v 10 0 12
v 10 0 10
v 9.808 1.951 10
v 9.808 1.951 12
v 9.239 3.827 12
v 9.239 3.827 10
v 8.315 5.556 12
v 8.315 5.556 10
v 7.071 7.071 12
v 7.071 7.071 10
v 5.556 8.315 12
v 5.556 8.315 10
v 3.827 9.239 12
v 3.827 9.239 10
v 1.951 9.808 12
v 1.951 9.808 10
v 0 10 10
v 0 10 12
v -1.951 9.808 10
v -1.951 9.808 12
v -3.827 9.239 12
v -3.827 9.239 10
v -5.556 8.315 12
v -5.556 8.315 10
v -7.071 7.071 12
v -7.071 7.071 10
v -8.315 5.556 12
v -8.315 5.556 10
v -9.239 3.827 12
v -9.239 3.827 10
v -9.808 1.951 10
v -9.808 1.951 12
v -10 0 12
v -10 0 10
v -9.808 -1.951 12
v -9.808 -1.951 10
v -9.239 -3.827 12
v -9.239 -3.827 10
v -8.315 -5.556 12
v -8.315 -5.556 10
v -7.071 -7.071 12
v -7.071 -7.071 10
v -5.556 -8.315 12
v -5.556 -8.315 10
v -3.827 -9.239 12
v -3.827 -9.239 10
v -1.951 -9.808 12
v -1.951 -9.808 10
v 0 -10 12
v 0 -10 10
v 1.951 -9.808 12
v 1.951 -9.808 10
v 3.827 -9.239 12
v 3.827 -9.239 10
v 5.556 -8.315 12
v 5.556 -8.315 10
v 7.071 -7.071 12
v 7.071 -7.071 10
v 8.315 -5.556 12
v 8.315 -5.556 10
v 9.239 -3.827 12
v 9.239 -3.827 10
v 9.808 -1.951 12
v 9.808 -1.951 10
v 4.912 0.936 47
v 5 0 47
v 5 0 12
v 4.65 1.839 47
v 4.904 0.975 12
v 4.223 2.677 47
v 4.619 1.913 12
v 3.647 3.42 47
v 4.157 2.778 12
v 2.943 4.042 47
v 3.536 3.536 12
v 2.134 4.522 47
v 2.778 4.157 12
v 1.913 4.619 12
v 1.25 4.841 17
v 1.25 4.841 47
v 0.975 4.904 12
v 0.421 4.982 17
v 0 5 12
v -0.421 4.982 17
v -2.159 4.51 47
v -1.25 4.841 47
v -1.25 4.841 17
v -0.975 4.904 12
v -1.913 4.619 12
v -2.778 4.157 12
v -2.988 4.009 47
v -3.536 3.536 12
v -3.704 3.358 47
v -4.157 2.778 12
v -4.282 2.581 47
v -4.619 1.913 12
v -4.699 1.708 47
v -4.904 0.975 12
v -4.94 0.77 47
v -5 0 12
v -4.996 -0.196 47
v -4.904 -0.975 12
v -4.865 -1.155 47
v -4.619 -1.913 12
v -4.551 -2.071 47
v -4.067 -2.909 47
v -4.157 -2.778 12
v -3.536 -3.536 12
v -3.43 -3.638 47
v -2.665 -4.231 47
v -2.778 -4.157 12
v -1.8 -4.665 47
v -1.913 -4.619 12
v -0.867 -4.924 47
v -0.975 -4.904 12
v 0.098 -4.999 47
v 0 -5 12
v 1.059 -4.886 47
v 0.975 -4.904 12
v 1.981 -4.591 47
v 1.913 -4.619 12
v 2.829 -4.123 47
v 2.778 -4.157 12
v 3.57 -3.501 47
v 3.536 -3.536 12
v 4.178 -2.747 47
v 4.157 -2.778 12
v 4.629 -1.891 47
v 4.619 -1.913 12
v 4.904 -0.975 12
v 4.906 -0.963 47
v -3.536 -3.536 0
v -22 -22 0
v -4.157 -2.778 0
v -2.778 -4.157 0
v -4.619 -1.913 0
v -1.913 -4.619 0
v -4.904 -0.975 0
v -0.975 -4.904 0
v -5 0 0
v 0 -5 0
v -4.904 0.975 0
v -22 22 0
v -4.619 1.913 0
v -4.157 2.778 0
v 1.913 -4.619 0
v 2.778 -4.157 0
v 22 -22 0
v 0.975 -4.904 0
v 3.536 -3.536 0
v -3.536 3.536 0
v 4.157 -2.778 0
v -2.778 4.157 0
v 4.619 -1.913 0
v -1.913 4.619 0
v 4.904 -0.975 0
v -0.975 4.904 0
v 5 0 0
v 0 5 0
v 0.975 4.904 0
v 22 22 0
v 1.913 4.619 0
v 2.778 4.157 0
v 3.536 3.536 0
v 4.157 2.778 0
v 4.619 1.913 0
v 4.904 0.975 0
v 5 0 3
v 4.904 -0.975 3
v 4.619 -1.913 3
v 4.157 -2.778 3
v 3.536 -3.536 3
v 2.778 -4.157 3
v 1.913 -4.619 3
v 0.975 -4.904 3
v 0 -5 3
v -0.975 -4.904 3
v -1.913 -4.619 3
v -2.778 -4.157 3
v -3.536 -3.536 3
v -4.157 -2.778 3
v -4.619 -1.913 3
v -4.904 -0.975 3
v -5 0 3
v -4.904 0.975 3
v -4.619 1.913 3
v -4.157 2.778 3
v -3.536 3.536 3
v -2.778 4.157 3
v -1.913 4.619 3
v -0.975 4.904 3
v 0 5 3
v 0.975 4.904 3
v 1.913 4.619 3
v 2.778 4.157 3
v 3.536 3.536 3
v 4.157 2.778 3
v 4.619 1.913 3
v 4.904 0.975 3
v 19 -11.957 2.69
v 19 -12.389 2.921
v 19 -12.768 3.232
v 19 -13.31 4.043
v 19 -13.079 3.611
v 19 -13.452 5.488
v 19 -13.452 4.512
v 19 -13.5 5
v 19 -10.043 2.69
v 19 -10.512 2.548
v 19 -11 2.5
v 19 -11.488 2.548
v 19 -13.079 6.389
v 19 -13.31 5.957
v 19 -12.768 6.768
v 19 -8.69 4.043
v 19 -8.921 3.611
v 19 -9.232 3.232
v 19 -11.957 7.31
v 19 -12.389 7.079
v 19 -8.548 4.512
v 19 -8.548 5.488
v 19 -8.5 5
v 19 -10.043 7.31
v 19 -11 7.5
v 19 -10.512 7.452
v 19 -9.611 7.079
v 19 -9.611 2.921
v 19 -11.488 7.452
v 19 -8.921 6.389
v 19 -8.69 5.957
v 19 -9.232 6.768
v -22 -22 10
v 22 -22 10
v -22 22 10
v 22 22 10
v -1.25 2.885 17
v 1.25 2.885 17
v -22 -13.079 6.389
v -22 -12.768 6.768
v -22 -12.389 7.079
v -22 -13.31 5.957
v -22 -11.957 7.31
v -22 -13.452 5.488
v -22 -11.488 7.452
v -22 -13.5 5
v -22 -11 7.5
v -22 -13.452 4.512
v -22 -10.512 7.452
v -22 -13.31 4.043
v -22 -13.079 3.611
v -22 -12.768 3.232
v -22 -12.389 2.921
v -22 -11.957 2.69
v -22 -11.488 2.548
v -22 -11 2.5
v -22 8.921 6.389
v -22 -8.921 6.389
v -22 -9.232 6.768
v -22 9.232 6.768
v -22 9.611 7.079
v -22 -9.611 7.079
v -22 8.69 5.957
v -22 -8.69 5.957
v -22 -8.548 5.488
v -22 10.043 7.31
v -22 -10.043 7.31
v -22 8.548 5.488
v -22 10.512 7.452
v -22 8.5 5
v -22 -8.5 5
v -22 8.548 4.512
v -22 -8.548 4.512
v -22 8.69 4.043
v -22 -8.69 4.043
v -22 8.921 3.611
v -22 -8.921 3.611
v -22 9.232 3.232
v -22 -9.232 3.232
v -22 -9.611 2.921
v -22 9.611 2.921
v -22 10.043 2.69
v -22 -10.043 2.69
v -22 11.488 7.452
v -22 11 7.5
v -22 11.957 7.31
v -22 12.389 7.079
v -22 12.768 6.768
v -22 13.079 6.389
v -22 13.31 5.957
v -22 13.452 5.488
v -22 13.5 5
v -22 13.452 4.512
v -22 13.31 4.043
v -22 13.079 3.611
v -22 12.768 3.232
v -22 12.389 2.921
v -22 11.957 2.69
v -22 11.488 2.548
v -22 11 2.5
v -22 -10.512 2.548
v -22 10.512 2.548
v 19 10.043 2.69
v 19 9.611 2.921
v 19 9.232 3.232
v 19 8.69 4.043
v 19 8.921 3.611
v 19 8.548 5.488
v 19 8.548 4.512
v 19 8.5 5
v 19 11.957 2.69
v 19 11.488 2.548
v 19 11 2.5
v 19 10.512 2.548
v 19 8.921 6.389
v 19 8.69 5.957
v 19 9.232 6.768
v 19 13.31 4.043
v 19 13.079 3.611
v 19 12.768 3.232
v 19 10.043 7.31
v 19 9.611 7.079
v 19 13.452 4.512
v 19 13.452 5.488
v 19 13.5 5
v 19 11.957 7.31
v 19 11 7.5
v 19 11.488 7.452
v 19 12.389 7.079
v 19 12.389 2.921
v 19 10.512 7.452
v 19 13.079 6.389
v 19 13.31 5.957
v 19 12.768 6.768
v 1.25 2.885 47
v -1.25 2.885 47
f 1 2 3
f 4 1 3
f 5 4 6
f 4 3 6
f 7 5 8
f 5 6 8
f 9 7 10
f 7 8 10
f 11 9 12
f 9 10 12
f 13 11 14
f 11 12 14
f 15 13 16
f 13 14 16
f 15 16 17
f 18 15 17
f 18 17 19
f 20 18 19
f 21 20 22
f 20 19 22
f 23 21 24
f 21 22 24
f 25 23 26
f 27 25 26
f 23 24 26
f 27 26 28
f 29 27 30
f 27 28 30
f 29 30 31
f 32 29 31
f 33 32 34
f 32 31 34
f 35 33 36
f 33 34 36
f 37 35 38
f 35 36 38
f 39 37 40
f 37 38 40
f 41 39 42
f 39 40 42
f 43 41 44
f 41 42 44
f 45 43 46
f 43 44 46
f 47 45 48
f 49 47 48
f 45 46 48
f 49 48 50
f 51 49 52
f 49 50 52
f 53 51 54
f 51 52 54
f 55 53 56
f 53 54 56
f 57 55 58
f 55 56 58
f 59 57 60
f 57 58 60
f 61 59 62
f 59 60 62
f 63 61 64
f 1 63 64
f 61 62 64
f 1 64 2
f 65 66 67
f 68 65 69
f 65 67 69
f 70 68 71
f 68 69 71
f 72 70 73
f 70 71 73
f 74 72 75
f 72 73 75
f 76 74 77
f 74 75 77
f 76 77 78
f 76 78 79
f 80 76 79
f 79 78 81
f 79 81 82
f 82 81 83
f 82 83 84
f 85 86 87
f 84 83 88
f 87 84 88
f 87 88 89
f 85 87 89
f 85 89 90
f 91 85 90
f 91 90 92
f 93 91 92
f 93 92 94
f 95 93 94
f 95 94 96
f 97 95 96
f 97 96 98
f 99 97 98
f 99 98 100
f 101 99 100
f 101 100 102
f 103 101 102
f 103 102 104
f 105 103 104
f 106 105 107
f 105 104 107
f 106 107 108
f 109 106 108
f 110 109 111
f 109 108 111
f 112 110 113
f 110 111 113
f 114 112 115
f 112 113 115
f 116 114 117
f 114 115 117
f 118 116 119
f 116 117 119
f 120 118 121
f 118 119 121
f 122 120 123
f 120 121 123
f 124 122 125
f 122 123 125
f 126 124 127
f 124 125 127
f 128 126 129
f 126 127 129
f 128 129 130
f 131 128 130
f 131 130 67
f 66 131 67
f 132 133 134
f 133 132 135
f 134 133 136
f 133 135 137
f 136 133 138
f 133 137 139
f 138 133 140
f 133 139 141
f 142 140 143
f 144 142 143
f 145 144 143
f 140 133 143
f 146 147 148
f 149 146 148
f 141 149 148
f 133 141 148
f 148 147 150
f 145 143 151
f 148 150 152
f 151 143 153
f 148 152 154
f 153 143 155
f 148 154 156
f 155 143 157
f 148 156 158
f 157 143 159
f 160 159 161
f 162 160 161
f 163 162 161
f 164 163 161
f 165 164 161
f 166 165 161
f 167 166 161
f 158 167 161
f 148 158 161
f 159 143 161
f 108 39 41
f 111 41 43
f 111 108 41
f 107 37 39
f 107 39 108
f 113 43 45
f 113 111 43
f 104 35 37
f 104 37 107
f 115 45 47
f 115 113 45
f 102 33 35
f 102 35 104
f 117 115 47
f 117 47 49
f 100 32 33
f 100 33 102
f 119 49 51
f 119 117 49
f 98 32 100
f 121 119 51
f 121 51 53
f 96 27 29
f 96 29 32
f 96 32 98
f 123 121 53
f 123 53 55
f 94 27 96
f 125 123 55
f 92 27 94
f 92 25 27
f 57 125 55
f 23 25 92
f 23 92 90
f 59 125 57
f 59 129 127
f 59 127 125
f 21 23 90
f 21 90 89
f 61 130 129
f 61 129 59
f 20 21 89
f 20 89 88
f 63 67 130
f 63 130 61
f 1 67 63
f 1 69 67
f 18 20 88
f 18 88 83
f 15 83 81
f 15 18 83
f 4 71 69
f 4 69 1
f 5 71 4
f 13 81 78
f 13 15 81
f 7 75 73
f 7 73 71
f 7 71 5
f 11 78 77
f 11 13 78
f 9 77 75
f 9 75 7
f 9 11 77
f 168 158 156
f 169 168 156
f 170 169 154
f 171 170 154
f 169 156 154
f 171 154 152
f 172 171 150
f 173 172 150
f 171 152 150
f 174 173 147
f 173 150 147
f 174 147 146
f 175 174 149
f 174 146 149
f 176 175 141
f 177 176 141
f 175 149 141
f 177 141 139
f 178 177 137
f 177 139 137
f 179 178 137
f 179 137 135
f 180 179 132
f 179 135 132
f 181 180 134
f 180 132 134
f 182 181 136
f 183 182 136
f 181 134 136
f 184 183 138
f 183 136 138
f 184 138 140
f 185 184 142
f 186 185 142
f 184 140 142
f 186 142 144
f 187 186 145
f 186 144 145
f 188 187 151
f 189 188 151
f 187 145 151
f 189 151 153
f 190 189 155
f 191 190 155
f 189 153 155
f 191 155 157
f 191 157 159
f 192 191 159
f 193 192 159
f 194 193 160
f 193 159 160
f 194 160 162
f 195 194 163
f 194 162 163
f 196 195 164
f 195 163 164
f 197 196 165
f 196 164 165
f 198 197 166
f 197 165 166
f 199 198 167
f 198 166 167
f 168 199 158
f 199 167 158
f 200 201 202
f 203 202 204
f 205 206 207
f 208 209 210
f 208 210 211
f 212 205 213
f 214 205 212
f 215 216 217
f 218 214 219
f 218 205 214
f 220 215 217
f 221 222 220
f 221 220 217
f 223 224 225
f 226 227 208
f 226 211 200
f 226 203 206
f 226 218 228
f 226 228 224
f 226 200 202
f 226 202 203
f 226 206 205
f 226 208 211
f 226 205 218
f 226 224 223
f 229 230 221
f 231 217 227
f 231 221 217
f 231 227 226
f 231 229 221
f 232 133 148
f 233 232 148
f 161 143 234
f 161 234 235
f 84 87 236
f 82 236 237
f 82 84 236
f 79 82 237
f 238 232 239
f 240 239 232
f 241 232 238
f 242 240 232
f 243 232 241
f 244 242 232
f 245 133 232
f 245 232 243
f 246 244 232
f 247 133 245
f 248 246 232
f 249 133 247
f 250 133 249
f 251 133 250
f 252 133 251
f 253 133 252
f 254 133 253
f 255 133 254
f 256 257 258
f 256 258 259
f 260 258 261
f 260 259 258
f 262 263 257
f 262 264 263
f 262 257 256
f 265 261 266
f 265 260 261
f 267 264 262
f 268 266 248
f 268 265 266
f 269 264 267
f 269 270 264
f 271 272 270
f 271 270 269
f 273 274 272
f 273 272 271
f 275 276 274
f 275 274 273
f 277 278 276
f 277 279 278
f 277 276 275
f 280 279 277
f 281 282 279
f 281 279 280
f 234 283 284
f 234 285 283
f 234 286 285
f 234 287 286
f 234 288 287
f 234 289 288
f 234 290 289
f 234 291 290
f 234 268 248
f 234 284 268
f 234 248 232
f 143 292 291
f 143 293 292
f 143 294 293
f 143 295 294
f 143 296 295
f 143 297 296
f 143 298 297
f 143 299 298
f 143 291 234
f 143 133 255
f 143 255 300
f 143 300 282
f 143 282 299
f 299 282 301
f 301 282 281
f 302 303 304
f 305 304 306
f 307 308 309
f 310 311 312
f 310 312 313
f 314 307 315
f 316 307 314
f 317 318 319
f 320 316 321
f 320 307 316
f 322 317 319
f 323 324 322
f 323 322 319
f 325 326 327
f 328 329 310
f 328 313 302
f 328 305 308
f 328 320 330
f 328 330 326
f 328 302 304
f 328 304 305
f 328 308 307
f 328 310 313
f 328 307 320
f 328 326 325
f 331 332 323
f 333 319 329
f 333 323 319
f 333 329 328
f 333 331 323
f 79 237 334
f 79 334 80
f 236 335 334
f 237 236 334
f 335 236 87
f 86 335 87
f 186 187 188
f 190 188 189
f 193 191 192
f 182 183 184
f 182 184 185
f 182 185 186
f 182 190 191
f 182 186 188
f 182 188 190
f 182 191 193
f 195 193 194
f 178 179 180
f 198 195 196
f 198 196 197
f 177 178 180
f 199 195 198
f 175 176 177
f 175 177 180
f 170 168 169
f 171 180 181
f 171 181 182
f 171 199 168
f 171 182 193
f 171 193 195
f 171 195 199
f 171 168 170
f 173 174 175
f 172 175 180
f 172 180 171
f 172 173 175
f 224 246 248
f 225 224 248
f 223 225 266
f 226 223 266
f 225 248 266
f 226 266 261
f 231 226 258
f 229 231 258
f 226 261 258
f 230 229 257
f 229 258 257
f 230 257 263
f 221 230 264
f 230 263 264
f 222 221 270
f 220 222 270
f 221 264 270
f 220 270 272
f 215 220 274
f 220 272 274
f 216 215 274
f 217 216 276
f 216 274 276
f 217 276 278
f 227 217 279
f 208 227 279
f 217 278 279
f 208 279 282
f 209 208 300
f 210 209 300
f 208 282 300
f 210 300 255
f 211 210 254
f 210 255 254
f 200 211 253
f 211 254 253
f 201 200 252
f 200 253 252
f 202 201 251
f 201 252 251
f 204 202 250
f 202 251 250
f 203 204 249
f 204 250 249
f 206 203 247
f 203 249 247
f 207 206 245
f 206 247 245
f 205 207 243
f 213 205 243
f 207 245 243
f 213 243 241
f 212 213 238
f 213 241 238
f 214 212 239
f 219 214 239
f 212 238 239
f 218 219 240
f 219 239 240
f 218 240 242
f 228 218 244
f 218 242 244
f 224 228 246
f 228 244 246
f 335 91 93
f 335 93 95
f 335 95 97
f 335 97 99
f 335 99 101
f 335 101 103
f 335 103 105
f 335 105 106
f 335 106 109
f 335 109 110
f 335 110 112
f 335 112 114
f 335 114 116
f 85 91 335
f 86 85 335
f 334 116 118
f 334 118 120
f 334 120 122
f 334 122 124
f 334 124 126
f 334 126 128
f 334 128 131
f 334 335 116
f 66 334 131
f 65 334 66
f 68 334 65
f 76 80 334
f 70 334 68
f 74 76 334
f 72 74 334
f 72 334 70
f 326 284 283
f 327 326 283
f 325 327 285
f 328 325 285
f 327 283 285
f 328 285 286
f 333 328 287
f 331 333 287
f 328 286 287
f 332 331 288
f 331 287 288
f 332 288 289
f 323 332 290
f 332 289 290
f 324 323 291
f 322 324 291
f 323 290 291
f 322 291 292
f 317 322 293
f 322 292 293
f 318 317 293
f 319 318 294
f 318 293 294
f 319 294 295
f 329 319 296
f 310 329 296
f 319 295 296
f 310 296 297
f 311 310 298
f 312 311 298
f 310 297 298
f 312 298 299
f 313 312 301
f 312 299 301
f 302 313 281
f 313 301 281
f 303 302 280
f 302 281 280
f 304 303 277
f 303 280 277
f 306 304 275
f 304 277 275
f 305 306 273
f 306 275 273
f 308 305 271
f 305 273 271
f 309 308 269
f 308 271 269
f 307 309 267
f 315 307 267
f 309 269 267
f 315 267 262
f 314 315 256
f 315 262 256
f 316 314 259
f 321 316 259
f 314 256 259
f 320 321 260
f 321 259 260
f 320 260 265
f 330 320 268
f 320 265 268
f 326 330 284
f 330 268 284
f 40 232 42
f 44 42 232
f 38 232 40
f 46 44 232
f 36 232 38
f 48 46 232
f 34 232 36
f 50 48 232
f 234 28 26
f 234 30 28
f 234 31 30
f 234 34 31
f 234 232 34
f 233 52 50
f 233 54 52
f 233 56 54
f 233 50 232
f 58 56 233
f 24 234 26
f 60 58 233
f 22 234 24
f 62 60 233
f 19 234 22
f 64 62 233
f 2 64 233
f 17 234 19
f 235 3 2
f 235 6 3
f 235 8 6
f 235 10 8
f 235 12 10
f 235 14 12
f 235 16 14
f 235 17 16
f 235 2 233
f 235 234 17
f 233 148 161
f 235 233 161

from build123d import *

# Parameters (mm, degrees)
SKETCH1_W           = 44
SKETCH1_H           = 44
BOSS_EXTRUDE1_DEPTH = 10
SKETCH2_R           = 5
BOSS_EXTRUDE2_DEPTH = 37
SKETCH3_R           = 5
BOSS_EXTRUDE3_DEPTH = 3
SKETCH4_R           = 5
CUT_EXTRUDE1_DEPTH  = 3
SKETCH5_R           = 2.5
CUT_EXTRUDE2_DEPTH  = 41
SKETCH6_R           = 10
BOSS_EXTRUDE4_DEPTH = 2
SKETCH7_W           = 2.5
SKETCH7_H           = 3
CUT_EXTRUDE3_DEPTH  = 30


with BuildPart() as part:
    # Sketch1 → Boss-Extrude1 (new body)
    with BuildSketch(Plane.XY):
        Rectangle(SKETCH1_W, SKETCH1_H)
    extrude(amount=BOSS_EXTRUDE1_DEPTH)

    # Sketch2 → Boss-Extrude2 (add)
    with BuildSketch(Plane.XY.offset(10)):
        Circle(SKETCH2_R)
    extrude(amount=BOSS_EXTRUDE2_DEPTH)

    # Sketch3 → Boss-Extrude3 (add)
    with BuildSketch(Plane(origin=(0, 0, 0), x_dir=(-1, 0, 0), z_dir=(0, 0, -1))):
        with Locations(Location((0, 0, 0), (0, 0, 180))):
            Circle(SKETCH3_R)
    extrude(amount=-BOSS_EXTRUDE3_DEPTH)

    # Sketch4 → Cut-Extrude1 (cut)
    with BuildSketch(Plane(origin=(0, 0, 0), x_dir=(-1, 0, 0), z_dir=(0, 0, -1))):
        with Locations(Location((0, 0, 0), (0, 0, 180))):
            Circle(SKETCH4_R)
    extrude(amount=-CUT_EXTRUDE1_DEPTH, mode=Mode.SUBTRACT)

    # Sketch5 → Cut-Extrude2 (cut)
    with BuildSketch(Plane.ZY.offset(22)):
        with Locations((5, -11)):
            Circle(SKETCH5_R)
        with Locations((5, 11)):
            Circle(SKETCH5_R)
    extrude(amount=-CUT_EXTRUDE2_DEPTH, mode=Mode.SUBTRACT)

    # Sketch6 → Boss-Extrude4 (add)
    with BuildSketch(Plane.XY.offset(10)):
        Circle(SKETCH6_R)
    extrude(amount=BOSS_EXTRUDE4_DEPTH)

    # Sketch7 → Cut-Extrude3 (cut)
    with BuildSketch(Plane.XY.offset(47)):
        with Locations((0, 4.385245902)):
            Rectangle(SKETCH7_W, SKETCH7_H)
    extrude(amount=-CUT_EXTRUDE3_DEPTH, mode=Mode.SUBTRACT)


solid = part.part
